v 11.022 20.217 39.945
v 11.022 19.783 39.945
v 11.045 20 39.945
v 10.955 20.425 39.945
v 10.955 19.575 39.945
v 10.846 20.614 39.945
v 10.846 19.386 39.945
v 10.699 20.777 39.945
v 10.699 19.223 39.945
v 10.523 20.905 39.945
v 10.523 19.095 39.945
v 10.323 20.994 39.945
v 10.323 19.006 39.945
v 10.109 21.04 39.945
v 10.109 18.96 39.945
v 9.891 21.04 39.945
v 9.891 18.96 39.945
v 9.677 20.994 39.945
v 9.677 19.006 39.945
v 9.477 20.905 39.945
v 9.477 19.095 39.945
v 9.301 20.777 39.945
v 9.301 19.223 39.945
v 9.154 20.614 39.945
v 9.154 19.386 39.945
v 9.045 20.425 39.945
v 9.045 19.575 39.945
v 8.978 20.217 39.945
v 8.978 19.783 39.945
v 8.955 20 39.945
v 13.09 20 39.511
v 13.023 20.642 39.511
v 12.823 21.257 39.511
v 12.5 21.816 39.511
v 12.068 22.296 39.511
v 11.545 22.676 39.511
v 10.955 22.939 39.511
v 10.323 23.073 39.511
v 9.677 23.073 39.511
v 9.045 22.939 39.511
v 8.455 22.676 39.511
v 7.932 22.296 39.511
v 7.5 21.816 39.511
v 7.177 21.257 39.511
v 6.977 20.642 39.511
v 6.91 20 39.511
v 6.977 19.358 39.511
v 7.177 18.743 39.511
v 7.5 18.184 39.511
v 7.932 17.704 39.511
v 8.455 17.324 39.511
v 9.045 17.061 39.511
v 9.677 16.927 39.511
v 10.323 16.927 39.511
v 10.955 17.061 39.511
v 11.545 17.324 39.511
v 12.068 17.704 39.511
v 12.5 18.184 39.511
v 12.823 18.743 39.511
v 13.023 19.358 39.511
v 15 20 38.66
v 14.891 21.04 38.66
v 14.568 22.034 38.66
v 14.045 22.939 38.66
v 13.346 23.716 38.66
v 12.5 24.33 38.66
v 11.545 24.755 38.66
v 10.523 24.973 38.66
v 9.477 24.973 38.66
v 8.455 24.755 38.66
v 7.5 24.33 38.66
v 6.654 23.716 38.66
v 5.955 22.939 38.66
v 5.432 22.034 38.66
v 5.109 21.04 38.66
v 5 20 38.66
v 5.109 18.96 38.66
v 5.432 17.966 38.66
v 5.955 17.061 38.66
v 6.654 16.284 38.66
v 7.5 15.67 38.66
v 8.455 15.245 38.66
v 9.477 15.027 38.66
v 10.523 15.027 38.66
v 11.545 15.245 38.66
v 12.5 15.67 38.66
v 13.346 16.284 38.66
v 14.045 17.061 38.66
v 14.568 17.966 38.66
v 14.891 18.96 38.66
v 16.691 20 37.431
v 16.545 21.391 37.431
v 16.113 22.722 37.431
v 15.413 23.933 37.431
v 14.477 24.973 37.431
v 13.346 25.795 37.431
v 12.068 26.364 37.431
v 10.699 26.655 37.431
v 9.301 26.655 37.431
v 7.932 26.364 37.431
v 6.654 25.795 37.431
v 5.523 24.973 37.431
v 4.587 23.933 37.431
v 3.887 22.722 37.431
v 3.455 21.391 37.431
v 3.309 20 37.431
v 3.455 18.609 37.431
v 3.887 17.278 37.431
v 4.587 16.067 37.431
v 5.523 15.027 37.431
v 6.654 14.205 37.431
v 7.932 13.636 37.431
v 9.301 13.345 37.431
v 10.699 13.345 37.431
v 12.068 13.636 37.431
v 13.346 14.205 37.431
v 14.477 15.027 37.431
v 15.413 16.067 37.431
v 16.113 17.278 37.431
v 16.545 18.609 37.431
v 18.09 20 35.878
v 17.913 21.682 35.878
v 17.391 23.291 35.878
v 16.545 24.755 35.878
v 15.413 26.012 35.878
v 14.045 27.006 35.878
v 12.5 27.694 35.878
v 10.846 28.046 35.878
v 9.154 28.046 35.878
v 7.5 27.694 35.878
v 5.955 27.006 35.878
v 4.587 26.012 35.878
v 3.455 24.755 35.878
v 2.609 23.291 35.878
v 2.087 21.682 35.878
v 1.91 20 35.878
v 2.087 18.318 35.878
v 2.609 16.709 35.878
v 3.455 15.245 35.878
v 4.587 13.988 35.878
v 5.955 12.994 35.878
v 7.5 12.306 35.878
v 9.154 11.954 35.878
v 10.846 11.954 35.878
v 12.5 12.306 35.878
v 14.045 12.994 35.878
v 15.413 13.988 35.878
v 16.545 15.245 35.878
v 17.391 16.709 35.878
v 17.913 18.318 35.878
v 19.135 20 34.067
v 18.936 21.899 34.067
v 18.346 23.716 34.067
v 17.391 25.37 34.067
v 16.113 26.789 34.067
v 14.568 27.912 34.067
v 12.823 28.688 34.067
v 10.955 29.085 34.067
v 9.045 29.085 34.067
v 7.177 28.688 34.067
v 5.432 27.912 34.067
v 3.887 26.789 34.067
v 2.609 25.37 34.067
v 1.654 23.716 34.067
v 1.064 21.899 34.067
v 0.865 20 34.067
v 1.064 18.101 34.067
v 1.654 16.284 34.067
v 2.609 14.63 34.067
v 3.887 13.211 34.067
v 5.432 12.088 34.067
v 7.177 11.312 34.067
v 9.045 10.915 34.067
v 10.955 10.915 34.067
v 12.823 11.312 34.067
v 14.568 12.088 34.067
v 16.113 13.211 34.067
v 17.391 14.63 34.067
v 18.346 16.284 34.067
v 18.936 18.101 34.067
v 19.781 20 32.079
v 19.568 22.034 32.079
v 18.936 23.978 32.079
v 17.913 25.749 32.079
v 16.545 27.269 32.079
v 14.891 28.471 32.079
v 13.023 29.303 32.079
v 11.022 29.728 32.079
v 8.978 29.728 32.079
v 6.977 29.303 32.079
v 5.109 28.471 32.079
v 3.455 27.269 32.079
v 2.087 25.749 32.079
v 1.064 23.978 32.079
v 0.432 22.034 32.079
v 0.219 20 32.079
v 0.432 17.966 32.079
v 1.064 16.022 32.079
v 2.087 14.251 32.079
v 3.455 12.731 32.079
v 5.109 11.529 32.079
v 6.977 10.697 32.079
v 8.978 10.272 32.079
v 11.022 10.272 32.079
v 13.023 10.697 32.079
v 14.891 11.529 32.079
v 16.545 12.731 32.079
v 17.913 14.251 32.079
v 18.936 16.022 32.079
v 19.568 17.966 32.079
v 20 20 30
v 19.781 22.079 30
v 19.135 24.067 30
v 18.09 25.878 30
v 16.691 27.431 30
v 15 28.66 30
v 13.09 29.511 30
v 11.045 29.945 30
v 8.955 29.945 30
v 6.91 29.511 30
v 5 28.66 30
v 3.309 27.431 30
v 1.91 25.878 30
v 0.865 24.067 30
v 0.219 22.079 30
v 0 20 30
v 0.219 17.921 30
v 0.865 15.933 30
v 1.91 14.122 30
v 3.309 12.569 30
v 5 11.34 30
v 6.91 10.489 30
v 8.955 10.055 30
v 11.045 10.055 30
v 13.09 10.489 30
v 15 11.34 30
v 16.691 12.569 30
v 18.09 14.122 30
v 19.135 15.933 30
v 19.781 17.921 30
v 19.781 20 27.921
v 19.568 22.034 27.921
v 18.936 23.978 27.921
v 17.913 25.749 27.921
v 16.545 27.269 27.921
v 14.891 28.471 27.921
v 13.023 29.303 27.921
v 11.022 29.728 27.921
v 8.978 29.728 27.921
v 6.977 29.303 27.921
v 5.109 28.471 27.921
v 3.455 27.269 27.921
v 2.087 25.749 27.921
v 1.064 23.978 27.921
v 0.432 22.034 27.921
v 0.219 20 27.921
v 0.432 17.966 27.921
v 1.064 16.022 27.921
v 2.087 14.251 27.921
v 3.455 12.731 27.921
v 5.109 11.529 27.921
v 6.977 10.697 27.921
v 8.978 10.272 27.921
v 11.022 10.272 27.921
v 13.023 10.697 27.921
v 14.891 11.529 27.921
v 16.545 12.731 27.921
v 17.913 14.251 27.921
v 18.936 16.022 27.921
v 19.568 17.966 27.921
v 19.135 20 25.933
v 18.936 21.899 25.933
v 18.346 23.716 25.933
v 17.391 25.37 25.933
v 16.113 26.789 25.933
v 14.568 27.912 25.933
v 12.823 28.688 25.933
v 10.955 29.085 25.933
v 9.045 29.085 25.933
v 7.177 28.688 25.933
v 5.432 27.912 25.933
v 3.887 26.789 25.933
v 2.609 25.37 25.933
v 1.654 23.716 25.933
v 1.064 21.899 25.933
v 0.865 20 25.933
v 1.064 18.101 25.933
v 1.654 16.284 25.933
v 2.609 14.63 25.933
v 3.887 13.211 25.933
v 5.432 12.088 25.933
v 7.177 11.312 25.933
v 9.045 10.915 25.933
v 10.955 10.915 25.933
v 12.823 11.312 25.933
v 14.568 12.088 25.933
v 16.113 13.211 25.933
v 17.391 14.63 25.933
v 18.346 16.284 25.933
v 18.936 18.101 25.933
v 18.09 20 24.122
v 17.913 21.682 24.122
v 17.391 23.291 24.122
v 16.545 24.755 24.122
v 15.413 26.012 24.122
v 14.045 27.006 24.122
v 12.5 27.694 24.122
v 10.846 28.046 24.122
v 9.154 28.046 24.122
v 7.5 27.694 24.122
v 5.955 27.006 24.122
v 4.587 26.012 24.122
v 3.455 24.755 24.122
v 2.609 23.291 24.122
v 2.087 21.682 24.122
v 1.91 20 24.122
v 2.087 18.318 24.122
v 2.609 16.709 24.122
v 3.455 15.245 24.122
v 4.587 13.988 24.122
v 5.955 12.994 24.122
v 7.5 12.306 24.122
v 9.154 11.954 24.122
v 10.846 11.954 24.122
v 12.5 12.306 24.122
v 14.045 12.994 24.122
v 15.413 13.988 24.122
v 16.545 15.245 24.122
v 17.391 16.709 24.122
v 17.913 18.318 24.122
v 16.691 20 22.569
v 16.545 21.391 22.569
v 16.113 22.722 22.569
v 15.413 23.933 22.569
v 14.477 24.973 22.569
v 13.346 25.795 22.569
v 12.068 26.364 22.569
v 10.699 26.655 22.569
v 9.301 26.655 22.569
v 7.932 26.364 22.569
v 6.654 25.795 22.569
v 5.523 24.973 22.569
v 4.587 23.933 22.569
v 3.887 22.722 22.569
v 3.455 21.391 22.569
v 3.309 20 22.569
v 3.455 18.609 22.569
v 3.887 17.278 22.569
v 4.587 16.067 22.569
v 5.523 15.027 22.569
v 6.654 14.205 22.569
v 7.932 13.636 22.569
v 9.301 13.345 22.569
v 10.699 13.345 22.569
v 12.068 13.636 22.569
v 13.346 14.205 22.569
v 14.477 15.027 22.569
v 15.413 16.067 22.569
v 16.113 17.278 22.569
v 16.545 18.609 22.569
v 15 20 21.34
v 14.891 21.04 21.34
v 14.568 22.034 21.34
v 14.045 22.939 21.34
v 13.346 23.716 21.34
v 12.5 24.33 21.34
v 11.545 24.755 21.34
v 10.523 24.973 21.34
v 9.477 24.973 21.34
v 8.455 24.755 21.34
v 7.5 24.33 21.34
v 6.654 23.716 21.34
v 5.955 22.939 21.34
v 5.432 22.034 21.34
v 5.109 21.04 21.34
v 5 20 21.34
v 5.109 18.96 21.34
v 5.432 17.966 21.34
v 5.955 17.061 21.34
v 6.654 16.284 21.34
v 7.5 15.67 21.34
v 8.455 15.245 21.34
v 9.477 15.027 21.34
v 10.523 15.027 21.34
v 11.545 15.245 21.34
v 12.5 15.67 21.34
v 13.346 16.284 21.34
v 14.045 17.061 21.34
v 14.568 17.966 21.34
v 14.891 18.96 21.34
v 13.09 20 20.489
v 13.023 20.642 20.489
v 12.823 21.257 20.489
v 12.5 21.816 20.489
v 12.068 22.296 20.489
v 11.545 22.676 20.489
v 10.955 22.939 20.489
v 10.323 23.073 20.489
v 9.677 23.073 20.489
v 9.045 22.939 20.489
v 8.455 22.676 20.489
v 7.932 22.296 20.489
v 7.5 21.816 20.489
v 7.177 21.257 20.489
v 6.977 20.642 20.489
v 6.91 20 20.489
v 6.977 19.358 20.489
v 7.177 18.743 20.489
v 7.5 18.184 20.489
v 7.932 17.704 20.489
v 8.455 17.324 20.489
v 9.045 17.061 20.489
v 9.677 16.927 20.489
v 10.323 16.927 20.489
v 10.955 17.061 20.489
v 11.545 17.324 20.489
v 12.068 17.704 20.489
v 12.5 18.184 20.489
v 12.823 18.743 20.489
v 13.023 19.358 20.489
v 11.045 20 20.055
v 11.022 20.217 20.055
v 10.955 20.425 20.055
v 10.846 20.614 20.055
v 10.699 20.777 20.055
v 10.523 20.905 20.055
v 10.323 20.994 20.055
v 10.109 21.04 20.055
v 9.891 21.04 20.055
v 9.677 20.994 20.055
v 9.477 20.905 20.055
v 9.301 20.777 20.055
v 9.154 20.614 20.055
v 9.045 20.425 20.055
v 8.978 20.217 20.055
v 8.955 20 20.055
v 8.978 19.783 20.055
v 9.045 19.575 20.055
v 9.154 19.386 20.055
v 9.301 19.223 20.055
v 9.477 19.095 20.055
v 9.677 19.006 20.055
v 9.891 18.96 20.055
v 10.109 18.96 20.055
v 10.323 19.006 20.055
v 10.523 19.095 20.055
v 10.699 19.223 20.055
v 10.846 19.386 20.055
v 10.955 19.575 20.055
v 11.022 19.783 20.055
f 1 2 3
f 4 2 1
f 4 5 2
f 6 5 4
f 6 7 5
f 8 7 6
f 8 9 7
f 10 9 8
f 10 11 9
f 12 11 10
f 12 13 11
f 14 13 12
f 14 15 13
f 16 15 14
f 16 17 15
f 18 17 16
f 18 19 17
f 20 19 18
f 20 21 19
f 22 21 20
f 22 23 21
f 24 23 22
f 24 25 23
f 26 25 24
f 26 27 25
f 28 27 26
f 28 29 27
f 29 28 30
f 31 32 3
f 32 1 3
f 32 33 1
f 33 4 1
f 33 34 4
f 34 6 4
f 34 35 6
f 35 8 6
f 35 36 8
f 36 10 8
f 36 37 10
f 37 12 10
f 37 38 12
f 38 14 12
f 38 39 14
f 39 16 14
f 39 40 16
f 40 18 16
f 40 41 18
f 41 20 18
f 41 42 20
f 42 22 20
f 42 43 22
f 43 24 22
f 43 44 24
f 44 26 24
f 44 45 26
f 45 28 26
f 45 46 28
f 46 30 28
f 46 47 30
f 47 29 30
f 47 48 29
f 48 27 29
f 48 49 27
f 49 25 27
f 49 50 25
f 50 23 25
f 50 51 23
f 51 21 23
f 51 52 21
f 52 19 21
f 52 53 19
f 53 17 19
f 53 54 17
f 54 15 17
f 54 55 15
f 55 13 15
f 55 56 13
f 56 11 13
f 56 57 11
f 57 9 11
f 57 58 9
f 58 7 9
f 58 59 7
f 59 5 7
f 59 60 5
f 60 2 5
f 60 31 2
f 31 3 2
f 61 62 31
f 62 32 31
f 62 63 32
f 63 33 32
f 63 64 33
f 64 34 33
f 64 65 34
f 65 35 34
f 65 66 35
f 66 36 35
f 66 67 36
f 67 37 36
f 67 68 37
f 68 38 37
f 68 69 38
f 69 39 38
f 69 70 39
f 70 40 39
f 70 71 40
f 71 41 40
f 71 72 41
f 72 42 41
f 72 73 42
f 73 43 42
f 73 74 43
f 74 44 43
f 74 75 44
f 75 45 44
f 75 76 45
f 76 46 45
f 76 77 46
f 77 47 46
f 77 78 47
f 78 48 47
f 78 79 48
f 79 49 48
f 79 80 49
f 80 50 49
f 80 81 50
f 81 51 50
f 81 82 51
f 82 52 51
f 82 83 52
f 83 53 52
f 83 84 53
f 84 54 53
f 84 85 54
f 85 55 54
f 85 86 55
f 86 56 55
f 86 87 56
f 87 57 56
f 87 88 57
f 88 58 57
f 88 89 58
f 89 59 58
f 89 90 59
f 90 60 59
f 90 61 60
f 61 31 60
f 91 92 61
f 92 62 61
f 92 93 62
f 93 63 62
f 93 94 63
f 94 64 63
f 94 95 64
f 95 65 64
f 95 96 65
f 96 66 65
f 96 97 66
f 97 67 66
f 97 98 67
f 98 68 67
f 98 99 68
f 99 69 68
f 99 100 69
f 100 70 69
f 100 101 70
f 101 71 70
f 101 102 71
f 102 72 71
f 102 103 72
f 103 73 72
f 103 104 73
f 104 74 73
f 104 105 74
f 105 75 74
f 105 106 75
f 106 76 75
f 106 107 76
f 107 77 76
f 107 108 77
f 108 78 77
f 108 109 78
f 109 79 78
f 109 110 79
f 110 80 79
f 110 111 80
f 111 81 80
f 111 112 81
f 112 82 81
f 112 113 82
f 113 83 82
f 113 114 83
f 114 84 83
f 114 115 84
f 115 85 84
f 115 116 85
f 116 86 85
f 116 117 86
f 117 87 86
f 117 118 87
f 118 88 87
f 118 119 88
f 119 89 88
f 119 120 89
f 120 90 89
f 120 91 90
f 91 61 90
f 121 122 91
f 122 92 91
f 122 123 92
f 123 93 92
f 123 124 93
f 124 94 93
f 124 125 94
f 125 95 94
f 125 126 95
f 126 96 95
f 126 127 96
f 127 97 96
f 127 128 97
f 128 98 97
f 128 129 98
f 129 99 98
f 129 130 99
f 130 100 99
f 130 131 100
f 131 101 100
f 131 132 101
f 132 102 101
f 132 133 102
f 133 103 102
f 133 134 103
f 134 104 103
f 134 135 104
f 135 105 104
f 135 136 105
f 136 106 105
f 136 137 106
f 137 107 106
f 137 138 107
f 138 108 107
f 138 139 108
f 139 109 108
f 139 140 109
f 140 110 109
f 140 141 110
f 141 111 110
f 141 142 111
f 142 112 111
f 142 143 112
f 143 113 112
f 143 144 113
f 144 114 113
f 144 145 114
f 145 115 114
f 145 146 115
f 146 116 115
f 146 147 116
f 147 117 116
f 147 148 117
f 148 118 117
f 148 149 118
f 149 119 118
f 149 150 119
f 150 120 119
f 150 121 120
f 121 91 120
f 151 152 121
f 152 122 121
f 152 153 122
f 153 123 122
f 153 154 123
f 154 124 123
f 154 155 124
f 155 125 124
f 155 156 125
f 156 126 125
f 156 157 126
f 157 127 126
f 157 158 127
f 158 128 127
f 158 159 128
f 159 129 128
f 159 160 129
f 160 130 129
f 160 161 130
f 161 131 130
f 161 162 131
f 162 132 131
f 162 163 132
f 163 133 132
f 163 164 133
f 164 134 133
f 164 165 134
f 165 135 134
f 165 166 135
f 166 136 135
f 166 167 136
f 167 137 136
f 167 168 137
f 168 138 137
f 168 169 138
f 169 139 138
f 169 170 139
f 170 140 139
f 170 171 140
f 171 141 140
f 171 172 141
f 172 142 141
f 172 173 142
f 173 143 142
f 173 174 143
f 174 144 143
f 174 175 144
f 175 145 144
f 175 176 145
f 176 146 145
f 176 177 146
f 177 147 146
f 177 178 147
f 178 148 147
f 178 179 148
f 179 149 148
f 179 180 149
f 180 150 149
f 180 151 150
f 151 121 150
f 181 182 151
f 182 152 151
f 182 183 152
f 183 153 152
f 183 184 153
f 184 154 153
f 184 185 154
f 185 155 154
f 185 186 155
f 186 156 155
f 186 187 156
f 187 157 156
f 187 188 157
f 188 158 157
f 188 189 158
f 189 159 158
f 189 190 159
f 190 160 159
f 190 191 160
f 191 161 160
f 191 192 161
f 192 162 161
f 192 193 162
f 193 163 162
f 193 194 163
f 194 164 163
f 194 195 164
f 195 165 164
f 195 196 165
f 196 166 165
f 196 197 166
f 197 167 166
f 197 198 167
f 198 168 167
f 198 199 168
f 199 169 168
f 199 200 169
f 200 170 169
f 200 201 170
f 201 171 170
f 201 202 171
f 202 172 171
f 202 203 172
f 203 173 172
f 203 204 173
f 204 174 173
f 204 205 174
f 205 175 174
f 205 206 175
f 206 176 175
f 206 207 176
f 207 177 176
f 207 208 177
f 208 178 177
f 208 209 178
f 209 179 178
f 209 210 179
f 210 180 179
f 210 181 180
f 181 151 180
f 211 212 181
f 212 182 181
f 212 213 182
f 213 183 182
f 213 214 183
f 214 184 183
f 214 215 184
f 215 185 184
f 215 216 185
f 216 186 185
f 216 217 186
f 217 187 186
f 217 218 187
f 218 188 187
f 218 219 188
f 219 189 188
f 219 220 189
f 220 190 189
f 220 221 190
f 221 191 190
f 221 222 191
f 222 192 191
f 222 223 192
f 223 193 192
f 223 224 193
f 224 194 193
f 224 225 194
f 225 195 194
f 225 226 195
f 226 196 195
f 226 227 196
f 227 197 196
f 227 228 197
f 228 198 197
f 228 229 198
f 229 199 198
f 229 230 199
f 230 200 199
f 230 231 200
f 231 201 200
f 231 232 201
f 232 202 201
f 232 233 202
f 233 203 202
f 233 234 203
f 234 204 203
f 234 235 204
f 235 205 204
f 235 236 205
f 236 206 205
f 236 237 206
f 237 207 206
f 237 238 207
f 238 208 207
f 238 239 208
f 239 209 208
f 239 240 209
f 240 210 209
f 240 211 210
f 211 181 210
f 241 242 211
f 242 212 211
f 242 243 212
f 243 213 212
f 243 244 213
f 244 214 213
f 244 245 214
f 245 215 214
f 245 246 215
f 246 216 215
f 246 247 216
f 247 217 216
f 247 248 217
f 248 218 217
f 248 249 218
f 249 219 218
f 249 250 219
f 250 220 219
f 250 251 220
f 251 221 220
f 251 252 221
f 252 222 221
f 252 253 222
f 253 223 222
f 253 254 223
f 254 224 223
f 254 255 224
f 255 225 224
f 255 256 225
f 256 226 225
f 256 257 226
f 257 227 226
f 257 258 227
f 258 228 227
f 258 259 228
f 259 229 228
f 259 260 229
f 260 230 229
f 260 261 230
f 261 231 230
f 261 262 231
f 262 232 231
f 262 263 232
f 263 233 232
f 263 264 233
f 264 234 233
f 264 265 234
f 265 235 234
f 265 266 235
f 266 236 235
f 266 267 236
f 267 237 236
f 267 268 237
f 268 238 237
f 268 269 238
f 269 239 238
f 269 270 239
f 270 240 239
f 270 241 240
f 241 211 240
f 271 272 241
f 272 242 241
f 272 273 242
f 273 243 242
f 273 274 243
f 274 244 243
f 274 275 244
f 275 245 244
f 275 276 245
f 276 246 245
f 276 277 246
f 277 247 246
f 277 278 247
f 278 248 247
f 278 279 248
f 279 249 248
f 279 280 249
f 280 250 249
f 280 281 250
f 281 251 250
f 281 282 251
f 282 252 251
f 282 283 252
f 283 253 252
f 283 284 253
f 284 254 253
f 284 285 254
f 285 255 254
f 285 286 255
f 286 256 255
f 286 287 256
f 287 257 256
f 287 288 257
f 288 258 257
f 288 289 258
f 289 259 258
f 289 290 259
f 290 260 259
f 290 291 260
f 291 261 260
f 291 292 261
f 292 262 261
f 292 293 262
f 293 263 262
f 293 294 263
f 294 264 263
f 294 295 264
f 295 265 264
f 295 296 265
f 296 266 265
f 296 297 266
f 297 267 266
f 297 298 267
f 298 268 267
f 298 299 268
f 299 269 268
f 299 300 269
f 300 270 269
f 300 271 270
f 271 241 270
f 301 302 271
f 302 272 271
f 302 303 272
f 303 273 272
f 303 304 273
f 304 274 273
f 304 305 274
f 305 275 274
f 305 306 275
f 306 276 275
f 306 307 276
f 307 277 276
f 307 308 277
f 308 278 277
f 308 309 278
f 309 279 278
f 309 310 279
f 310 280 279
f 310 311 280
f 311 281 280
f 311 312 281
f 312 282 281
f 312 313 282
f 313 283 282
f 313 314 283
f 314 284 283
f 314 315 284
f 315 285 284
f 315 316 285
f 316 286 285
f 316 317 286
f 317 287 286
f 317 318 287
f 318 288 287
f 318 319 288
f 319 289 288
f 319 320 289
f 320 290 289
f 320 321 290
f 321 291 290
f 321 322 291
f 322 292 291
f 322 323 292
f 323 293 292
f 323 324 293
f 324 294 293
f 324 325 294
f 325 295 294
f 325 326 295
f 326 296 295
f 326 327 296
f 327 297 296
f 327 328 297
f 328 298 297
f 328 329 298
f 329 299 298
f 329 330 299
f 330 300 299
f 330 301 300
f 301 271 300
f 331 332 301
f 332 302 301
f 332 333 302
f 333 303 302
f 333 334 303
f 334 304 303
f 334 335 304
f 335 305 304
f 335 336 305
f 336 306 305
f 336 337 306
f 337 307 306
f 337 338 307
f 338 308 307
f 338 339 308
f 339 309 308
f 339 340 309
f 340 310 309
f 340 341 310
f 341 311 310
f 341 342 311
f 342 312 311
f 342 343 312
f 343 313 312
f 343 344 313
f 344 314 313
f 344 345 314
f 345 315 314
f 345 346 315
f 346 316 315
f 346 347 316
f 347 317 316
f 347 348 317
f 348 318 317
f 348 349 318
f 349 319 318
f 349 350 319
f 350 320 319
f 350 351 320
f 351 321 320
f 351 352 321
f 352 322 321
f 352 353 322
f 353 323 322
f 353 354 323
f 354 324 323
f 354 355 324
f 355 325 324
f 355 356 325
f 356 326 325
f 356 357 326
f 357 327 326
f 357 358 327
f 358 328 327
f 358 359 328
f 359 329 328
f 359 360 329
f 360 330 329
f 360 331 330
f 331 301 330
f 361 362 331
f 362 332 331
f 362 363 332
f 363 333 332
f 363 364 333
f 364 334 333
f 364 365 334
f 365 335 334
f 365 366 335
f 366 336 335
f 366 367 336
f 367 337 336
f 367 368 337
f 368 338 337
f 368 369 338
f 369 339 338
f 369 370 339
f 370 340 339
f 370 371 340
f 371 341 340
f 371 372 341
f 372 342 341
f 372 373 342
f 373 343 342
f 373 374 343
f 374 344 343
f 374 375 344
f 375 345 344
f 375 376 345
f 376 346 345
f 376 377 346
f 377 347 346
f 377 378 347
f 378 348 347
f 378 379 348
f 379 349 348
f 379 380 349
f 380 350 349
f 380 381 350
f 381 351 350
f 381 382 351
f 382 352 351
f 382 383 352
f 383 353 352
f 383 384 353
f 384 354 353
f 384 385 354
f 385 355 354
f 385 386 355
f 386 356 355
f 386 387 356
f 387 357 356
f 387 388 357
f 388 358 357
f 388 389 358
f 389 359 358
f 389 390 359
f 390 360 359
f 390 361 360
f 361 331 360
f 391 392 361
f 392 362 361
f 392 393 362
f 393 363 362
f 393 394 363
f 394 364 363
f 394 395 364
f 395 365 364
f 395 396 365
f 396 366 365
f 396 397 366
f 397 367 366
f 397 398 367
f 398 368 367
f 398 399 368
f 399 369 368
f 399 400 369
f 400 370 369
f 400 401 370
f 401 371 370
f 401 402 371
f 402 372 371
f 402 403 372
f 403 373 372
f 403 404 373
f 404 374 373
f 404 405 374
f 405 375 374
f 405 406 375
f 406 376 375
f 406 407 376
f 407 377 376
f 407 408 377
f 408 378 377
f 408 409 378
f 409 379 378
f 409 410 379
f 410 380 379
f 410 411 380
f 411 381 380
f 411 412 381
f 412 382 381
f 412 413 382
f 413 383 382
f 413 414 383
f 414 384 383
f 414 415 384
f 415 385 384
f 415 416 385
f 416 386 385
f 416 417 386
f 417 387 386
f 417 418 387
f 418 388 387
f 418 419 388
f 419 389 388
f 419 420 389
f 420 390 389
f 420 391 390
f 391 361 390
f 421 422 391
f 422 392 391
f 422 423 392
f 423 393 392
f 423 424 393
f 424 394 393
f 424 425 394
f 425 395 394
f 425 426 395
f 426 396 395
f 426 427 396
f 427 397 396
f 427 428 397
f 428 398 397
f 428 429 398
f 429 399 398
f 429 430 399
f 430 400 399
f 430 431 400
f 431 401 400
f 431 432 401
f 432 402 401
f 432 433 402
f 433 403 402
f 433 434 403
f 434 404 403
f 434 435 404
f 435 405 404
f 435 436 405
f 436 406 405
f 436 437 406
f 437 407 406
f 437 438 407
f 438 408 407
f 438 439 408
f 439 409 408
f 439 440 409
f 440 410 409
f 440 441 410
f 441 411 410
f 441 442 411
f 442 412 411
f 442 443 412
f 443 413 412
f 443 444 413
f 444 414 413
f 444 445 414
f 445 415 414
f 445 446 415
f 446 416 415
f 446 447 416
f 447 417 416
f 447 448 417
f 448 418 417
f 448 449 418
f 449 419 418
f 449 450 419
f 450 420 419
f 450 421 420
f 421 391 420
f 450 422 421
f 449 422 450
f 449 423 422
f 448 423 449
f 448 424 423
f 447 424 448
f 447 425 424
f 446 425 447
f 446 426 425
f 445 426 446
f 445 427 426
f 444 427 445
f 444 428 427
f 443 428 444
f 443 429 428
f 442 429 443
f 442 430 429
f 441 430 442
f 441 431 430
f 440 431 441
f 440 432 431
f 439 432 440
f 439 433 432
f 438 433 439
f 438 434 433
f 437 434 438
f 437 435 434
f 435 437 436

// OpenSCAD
// Unit of length: Unit.INCH
translate(v = [10.0, 20.0, 30.0])
{
   sphere(r = 10.0);
}
